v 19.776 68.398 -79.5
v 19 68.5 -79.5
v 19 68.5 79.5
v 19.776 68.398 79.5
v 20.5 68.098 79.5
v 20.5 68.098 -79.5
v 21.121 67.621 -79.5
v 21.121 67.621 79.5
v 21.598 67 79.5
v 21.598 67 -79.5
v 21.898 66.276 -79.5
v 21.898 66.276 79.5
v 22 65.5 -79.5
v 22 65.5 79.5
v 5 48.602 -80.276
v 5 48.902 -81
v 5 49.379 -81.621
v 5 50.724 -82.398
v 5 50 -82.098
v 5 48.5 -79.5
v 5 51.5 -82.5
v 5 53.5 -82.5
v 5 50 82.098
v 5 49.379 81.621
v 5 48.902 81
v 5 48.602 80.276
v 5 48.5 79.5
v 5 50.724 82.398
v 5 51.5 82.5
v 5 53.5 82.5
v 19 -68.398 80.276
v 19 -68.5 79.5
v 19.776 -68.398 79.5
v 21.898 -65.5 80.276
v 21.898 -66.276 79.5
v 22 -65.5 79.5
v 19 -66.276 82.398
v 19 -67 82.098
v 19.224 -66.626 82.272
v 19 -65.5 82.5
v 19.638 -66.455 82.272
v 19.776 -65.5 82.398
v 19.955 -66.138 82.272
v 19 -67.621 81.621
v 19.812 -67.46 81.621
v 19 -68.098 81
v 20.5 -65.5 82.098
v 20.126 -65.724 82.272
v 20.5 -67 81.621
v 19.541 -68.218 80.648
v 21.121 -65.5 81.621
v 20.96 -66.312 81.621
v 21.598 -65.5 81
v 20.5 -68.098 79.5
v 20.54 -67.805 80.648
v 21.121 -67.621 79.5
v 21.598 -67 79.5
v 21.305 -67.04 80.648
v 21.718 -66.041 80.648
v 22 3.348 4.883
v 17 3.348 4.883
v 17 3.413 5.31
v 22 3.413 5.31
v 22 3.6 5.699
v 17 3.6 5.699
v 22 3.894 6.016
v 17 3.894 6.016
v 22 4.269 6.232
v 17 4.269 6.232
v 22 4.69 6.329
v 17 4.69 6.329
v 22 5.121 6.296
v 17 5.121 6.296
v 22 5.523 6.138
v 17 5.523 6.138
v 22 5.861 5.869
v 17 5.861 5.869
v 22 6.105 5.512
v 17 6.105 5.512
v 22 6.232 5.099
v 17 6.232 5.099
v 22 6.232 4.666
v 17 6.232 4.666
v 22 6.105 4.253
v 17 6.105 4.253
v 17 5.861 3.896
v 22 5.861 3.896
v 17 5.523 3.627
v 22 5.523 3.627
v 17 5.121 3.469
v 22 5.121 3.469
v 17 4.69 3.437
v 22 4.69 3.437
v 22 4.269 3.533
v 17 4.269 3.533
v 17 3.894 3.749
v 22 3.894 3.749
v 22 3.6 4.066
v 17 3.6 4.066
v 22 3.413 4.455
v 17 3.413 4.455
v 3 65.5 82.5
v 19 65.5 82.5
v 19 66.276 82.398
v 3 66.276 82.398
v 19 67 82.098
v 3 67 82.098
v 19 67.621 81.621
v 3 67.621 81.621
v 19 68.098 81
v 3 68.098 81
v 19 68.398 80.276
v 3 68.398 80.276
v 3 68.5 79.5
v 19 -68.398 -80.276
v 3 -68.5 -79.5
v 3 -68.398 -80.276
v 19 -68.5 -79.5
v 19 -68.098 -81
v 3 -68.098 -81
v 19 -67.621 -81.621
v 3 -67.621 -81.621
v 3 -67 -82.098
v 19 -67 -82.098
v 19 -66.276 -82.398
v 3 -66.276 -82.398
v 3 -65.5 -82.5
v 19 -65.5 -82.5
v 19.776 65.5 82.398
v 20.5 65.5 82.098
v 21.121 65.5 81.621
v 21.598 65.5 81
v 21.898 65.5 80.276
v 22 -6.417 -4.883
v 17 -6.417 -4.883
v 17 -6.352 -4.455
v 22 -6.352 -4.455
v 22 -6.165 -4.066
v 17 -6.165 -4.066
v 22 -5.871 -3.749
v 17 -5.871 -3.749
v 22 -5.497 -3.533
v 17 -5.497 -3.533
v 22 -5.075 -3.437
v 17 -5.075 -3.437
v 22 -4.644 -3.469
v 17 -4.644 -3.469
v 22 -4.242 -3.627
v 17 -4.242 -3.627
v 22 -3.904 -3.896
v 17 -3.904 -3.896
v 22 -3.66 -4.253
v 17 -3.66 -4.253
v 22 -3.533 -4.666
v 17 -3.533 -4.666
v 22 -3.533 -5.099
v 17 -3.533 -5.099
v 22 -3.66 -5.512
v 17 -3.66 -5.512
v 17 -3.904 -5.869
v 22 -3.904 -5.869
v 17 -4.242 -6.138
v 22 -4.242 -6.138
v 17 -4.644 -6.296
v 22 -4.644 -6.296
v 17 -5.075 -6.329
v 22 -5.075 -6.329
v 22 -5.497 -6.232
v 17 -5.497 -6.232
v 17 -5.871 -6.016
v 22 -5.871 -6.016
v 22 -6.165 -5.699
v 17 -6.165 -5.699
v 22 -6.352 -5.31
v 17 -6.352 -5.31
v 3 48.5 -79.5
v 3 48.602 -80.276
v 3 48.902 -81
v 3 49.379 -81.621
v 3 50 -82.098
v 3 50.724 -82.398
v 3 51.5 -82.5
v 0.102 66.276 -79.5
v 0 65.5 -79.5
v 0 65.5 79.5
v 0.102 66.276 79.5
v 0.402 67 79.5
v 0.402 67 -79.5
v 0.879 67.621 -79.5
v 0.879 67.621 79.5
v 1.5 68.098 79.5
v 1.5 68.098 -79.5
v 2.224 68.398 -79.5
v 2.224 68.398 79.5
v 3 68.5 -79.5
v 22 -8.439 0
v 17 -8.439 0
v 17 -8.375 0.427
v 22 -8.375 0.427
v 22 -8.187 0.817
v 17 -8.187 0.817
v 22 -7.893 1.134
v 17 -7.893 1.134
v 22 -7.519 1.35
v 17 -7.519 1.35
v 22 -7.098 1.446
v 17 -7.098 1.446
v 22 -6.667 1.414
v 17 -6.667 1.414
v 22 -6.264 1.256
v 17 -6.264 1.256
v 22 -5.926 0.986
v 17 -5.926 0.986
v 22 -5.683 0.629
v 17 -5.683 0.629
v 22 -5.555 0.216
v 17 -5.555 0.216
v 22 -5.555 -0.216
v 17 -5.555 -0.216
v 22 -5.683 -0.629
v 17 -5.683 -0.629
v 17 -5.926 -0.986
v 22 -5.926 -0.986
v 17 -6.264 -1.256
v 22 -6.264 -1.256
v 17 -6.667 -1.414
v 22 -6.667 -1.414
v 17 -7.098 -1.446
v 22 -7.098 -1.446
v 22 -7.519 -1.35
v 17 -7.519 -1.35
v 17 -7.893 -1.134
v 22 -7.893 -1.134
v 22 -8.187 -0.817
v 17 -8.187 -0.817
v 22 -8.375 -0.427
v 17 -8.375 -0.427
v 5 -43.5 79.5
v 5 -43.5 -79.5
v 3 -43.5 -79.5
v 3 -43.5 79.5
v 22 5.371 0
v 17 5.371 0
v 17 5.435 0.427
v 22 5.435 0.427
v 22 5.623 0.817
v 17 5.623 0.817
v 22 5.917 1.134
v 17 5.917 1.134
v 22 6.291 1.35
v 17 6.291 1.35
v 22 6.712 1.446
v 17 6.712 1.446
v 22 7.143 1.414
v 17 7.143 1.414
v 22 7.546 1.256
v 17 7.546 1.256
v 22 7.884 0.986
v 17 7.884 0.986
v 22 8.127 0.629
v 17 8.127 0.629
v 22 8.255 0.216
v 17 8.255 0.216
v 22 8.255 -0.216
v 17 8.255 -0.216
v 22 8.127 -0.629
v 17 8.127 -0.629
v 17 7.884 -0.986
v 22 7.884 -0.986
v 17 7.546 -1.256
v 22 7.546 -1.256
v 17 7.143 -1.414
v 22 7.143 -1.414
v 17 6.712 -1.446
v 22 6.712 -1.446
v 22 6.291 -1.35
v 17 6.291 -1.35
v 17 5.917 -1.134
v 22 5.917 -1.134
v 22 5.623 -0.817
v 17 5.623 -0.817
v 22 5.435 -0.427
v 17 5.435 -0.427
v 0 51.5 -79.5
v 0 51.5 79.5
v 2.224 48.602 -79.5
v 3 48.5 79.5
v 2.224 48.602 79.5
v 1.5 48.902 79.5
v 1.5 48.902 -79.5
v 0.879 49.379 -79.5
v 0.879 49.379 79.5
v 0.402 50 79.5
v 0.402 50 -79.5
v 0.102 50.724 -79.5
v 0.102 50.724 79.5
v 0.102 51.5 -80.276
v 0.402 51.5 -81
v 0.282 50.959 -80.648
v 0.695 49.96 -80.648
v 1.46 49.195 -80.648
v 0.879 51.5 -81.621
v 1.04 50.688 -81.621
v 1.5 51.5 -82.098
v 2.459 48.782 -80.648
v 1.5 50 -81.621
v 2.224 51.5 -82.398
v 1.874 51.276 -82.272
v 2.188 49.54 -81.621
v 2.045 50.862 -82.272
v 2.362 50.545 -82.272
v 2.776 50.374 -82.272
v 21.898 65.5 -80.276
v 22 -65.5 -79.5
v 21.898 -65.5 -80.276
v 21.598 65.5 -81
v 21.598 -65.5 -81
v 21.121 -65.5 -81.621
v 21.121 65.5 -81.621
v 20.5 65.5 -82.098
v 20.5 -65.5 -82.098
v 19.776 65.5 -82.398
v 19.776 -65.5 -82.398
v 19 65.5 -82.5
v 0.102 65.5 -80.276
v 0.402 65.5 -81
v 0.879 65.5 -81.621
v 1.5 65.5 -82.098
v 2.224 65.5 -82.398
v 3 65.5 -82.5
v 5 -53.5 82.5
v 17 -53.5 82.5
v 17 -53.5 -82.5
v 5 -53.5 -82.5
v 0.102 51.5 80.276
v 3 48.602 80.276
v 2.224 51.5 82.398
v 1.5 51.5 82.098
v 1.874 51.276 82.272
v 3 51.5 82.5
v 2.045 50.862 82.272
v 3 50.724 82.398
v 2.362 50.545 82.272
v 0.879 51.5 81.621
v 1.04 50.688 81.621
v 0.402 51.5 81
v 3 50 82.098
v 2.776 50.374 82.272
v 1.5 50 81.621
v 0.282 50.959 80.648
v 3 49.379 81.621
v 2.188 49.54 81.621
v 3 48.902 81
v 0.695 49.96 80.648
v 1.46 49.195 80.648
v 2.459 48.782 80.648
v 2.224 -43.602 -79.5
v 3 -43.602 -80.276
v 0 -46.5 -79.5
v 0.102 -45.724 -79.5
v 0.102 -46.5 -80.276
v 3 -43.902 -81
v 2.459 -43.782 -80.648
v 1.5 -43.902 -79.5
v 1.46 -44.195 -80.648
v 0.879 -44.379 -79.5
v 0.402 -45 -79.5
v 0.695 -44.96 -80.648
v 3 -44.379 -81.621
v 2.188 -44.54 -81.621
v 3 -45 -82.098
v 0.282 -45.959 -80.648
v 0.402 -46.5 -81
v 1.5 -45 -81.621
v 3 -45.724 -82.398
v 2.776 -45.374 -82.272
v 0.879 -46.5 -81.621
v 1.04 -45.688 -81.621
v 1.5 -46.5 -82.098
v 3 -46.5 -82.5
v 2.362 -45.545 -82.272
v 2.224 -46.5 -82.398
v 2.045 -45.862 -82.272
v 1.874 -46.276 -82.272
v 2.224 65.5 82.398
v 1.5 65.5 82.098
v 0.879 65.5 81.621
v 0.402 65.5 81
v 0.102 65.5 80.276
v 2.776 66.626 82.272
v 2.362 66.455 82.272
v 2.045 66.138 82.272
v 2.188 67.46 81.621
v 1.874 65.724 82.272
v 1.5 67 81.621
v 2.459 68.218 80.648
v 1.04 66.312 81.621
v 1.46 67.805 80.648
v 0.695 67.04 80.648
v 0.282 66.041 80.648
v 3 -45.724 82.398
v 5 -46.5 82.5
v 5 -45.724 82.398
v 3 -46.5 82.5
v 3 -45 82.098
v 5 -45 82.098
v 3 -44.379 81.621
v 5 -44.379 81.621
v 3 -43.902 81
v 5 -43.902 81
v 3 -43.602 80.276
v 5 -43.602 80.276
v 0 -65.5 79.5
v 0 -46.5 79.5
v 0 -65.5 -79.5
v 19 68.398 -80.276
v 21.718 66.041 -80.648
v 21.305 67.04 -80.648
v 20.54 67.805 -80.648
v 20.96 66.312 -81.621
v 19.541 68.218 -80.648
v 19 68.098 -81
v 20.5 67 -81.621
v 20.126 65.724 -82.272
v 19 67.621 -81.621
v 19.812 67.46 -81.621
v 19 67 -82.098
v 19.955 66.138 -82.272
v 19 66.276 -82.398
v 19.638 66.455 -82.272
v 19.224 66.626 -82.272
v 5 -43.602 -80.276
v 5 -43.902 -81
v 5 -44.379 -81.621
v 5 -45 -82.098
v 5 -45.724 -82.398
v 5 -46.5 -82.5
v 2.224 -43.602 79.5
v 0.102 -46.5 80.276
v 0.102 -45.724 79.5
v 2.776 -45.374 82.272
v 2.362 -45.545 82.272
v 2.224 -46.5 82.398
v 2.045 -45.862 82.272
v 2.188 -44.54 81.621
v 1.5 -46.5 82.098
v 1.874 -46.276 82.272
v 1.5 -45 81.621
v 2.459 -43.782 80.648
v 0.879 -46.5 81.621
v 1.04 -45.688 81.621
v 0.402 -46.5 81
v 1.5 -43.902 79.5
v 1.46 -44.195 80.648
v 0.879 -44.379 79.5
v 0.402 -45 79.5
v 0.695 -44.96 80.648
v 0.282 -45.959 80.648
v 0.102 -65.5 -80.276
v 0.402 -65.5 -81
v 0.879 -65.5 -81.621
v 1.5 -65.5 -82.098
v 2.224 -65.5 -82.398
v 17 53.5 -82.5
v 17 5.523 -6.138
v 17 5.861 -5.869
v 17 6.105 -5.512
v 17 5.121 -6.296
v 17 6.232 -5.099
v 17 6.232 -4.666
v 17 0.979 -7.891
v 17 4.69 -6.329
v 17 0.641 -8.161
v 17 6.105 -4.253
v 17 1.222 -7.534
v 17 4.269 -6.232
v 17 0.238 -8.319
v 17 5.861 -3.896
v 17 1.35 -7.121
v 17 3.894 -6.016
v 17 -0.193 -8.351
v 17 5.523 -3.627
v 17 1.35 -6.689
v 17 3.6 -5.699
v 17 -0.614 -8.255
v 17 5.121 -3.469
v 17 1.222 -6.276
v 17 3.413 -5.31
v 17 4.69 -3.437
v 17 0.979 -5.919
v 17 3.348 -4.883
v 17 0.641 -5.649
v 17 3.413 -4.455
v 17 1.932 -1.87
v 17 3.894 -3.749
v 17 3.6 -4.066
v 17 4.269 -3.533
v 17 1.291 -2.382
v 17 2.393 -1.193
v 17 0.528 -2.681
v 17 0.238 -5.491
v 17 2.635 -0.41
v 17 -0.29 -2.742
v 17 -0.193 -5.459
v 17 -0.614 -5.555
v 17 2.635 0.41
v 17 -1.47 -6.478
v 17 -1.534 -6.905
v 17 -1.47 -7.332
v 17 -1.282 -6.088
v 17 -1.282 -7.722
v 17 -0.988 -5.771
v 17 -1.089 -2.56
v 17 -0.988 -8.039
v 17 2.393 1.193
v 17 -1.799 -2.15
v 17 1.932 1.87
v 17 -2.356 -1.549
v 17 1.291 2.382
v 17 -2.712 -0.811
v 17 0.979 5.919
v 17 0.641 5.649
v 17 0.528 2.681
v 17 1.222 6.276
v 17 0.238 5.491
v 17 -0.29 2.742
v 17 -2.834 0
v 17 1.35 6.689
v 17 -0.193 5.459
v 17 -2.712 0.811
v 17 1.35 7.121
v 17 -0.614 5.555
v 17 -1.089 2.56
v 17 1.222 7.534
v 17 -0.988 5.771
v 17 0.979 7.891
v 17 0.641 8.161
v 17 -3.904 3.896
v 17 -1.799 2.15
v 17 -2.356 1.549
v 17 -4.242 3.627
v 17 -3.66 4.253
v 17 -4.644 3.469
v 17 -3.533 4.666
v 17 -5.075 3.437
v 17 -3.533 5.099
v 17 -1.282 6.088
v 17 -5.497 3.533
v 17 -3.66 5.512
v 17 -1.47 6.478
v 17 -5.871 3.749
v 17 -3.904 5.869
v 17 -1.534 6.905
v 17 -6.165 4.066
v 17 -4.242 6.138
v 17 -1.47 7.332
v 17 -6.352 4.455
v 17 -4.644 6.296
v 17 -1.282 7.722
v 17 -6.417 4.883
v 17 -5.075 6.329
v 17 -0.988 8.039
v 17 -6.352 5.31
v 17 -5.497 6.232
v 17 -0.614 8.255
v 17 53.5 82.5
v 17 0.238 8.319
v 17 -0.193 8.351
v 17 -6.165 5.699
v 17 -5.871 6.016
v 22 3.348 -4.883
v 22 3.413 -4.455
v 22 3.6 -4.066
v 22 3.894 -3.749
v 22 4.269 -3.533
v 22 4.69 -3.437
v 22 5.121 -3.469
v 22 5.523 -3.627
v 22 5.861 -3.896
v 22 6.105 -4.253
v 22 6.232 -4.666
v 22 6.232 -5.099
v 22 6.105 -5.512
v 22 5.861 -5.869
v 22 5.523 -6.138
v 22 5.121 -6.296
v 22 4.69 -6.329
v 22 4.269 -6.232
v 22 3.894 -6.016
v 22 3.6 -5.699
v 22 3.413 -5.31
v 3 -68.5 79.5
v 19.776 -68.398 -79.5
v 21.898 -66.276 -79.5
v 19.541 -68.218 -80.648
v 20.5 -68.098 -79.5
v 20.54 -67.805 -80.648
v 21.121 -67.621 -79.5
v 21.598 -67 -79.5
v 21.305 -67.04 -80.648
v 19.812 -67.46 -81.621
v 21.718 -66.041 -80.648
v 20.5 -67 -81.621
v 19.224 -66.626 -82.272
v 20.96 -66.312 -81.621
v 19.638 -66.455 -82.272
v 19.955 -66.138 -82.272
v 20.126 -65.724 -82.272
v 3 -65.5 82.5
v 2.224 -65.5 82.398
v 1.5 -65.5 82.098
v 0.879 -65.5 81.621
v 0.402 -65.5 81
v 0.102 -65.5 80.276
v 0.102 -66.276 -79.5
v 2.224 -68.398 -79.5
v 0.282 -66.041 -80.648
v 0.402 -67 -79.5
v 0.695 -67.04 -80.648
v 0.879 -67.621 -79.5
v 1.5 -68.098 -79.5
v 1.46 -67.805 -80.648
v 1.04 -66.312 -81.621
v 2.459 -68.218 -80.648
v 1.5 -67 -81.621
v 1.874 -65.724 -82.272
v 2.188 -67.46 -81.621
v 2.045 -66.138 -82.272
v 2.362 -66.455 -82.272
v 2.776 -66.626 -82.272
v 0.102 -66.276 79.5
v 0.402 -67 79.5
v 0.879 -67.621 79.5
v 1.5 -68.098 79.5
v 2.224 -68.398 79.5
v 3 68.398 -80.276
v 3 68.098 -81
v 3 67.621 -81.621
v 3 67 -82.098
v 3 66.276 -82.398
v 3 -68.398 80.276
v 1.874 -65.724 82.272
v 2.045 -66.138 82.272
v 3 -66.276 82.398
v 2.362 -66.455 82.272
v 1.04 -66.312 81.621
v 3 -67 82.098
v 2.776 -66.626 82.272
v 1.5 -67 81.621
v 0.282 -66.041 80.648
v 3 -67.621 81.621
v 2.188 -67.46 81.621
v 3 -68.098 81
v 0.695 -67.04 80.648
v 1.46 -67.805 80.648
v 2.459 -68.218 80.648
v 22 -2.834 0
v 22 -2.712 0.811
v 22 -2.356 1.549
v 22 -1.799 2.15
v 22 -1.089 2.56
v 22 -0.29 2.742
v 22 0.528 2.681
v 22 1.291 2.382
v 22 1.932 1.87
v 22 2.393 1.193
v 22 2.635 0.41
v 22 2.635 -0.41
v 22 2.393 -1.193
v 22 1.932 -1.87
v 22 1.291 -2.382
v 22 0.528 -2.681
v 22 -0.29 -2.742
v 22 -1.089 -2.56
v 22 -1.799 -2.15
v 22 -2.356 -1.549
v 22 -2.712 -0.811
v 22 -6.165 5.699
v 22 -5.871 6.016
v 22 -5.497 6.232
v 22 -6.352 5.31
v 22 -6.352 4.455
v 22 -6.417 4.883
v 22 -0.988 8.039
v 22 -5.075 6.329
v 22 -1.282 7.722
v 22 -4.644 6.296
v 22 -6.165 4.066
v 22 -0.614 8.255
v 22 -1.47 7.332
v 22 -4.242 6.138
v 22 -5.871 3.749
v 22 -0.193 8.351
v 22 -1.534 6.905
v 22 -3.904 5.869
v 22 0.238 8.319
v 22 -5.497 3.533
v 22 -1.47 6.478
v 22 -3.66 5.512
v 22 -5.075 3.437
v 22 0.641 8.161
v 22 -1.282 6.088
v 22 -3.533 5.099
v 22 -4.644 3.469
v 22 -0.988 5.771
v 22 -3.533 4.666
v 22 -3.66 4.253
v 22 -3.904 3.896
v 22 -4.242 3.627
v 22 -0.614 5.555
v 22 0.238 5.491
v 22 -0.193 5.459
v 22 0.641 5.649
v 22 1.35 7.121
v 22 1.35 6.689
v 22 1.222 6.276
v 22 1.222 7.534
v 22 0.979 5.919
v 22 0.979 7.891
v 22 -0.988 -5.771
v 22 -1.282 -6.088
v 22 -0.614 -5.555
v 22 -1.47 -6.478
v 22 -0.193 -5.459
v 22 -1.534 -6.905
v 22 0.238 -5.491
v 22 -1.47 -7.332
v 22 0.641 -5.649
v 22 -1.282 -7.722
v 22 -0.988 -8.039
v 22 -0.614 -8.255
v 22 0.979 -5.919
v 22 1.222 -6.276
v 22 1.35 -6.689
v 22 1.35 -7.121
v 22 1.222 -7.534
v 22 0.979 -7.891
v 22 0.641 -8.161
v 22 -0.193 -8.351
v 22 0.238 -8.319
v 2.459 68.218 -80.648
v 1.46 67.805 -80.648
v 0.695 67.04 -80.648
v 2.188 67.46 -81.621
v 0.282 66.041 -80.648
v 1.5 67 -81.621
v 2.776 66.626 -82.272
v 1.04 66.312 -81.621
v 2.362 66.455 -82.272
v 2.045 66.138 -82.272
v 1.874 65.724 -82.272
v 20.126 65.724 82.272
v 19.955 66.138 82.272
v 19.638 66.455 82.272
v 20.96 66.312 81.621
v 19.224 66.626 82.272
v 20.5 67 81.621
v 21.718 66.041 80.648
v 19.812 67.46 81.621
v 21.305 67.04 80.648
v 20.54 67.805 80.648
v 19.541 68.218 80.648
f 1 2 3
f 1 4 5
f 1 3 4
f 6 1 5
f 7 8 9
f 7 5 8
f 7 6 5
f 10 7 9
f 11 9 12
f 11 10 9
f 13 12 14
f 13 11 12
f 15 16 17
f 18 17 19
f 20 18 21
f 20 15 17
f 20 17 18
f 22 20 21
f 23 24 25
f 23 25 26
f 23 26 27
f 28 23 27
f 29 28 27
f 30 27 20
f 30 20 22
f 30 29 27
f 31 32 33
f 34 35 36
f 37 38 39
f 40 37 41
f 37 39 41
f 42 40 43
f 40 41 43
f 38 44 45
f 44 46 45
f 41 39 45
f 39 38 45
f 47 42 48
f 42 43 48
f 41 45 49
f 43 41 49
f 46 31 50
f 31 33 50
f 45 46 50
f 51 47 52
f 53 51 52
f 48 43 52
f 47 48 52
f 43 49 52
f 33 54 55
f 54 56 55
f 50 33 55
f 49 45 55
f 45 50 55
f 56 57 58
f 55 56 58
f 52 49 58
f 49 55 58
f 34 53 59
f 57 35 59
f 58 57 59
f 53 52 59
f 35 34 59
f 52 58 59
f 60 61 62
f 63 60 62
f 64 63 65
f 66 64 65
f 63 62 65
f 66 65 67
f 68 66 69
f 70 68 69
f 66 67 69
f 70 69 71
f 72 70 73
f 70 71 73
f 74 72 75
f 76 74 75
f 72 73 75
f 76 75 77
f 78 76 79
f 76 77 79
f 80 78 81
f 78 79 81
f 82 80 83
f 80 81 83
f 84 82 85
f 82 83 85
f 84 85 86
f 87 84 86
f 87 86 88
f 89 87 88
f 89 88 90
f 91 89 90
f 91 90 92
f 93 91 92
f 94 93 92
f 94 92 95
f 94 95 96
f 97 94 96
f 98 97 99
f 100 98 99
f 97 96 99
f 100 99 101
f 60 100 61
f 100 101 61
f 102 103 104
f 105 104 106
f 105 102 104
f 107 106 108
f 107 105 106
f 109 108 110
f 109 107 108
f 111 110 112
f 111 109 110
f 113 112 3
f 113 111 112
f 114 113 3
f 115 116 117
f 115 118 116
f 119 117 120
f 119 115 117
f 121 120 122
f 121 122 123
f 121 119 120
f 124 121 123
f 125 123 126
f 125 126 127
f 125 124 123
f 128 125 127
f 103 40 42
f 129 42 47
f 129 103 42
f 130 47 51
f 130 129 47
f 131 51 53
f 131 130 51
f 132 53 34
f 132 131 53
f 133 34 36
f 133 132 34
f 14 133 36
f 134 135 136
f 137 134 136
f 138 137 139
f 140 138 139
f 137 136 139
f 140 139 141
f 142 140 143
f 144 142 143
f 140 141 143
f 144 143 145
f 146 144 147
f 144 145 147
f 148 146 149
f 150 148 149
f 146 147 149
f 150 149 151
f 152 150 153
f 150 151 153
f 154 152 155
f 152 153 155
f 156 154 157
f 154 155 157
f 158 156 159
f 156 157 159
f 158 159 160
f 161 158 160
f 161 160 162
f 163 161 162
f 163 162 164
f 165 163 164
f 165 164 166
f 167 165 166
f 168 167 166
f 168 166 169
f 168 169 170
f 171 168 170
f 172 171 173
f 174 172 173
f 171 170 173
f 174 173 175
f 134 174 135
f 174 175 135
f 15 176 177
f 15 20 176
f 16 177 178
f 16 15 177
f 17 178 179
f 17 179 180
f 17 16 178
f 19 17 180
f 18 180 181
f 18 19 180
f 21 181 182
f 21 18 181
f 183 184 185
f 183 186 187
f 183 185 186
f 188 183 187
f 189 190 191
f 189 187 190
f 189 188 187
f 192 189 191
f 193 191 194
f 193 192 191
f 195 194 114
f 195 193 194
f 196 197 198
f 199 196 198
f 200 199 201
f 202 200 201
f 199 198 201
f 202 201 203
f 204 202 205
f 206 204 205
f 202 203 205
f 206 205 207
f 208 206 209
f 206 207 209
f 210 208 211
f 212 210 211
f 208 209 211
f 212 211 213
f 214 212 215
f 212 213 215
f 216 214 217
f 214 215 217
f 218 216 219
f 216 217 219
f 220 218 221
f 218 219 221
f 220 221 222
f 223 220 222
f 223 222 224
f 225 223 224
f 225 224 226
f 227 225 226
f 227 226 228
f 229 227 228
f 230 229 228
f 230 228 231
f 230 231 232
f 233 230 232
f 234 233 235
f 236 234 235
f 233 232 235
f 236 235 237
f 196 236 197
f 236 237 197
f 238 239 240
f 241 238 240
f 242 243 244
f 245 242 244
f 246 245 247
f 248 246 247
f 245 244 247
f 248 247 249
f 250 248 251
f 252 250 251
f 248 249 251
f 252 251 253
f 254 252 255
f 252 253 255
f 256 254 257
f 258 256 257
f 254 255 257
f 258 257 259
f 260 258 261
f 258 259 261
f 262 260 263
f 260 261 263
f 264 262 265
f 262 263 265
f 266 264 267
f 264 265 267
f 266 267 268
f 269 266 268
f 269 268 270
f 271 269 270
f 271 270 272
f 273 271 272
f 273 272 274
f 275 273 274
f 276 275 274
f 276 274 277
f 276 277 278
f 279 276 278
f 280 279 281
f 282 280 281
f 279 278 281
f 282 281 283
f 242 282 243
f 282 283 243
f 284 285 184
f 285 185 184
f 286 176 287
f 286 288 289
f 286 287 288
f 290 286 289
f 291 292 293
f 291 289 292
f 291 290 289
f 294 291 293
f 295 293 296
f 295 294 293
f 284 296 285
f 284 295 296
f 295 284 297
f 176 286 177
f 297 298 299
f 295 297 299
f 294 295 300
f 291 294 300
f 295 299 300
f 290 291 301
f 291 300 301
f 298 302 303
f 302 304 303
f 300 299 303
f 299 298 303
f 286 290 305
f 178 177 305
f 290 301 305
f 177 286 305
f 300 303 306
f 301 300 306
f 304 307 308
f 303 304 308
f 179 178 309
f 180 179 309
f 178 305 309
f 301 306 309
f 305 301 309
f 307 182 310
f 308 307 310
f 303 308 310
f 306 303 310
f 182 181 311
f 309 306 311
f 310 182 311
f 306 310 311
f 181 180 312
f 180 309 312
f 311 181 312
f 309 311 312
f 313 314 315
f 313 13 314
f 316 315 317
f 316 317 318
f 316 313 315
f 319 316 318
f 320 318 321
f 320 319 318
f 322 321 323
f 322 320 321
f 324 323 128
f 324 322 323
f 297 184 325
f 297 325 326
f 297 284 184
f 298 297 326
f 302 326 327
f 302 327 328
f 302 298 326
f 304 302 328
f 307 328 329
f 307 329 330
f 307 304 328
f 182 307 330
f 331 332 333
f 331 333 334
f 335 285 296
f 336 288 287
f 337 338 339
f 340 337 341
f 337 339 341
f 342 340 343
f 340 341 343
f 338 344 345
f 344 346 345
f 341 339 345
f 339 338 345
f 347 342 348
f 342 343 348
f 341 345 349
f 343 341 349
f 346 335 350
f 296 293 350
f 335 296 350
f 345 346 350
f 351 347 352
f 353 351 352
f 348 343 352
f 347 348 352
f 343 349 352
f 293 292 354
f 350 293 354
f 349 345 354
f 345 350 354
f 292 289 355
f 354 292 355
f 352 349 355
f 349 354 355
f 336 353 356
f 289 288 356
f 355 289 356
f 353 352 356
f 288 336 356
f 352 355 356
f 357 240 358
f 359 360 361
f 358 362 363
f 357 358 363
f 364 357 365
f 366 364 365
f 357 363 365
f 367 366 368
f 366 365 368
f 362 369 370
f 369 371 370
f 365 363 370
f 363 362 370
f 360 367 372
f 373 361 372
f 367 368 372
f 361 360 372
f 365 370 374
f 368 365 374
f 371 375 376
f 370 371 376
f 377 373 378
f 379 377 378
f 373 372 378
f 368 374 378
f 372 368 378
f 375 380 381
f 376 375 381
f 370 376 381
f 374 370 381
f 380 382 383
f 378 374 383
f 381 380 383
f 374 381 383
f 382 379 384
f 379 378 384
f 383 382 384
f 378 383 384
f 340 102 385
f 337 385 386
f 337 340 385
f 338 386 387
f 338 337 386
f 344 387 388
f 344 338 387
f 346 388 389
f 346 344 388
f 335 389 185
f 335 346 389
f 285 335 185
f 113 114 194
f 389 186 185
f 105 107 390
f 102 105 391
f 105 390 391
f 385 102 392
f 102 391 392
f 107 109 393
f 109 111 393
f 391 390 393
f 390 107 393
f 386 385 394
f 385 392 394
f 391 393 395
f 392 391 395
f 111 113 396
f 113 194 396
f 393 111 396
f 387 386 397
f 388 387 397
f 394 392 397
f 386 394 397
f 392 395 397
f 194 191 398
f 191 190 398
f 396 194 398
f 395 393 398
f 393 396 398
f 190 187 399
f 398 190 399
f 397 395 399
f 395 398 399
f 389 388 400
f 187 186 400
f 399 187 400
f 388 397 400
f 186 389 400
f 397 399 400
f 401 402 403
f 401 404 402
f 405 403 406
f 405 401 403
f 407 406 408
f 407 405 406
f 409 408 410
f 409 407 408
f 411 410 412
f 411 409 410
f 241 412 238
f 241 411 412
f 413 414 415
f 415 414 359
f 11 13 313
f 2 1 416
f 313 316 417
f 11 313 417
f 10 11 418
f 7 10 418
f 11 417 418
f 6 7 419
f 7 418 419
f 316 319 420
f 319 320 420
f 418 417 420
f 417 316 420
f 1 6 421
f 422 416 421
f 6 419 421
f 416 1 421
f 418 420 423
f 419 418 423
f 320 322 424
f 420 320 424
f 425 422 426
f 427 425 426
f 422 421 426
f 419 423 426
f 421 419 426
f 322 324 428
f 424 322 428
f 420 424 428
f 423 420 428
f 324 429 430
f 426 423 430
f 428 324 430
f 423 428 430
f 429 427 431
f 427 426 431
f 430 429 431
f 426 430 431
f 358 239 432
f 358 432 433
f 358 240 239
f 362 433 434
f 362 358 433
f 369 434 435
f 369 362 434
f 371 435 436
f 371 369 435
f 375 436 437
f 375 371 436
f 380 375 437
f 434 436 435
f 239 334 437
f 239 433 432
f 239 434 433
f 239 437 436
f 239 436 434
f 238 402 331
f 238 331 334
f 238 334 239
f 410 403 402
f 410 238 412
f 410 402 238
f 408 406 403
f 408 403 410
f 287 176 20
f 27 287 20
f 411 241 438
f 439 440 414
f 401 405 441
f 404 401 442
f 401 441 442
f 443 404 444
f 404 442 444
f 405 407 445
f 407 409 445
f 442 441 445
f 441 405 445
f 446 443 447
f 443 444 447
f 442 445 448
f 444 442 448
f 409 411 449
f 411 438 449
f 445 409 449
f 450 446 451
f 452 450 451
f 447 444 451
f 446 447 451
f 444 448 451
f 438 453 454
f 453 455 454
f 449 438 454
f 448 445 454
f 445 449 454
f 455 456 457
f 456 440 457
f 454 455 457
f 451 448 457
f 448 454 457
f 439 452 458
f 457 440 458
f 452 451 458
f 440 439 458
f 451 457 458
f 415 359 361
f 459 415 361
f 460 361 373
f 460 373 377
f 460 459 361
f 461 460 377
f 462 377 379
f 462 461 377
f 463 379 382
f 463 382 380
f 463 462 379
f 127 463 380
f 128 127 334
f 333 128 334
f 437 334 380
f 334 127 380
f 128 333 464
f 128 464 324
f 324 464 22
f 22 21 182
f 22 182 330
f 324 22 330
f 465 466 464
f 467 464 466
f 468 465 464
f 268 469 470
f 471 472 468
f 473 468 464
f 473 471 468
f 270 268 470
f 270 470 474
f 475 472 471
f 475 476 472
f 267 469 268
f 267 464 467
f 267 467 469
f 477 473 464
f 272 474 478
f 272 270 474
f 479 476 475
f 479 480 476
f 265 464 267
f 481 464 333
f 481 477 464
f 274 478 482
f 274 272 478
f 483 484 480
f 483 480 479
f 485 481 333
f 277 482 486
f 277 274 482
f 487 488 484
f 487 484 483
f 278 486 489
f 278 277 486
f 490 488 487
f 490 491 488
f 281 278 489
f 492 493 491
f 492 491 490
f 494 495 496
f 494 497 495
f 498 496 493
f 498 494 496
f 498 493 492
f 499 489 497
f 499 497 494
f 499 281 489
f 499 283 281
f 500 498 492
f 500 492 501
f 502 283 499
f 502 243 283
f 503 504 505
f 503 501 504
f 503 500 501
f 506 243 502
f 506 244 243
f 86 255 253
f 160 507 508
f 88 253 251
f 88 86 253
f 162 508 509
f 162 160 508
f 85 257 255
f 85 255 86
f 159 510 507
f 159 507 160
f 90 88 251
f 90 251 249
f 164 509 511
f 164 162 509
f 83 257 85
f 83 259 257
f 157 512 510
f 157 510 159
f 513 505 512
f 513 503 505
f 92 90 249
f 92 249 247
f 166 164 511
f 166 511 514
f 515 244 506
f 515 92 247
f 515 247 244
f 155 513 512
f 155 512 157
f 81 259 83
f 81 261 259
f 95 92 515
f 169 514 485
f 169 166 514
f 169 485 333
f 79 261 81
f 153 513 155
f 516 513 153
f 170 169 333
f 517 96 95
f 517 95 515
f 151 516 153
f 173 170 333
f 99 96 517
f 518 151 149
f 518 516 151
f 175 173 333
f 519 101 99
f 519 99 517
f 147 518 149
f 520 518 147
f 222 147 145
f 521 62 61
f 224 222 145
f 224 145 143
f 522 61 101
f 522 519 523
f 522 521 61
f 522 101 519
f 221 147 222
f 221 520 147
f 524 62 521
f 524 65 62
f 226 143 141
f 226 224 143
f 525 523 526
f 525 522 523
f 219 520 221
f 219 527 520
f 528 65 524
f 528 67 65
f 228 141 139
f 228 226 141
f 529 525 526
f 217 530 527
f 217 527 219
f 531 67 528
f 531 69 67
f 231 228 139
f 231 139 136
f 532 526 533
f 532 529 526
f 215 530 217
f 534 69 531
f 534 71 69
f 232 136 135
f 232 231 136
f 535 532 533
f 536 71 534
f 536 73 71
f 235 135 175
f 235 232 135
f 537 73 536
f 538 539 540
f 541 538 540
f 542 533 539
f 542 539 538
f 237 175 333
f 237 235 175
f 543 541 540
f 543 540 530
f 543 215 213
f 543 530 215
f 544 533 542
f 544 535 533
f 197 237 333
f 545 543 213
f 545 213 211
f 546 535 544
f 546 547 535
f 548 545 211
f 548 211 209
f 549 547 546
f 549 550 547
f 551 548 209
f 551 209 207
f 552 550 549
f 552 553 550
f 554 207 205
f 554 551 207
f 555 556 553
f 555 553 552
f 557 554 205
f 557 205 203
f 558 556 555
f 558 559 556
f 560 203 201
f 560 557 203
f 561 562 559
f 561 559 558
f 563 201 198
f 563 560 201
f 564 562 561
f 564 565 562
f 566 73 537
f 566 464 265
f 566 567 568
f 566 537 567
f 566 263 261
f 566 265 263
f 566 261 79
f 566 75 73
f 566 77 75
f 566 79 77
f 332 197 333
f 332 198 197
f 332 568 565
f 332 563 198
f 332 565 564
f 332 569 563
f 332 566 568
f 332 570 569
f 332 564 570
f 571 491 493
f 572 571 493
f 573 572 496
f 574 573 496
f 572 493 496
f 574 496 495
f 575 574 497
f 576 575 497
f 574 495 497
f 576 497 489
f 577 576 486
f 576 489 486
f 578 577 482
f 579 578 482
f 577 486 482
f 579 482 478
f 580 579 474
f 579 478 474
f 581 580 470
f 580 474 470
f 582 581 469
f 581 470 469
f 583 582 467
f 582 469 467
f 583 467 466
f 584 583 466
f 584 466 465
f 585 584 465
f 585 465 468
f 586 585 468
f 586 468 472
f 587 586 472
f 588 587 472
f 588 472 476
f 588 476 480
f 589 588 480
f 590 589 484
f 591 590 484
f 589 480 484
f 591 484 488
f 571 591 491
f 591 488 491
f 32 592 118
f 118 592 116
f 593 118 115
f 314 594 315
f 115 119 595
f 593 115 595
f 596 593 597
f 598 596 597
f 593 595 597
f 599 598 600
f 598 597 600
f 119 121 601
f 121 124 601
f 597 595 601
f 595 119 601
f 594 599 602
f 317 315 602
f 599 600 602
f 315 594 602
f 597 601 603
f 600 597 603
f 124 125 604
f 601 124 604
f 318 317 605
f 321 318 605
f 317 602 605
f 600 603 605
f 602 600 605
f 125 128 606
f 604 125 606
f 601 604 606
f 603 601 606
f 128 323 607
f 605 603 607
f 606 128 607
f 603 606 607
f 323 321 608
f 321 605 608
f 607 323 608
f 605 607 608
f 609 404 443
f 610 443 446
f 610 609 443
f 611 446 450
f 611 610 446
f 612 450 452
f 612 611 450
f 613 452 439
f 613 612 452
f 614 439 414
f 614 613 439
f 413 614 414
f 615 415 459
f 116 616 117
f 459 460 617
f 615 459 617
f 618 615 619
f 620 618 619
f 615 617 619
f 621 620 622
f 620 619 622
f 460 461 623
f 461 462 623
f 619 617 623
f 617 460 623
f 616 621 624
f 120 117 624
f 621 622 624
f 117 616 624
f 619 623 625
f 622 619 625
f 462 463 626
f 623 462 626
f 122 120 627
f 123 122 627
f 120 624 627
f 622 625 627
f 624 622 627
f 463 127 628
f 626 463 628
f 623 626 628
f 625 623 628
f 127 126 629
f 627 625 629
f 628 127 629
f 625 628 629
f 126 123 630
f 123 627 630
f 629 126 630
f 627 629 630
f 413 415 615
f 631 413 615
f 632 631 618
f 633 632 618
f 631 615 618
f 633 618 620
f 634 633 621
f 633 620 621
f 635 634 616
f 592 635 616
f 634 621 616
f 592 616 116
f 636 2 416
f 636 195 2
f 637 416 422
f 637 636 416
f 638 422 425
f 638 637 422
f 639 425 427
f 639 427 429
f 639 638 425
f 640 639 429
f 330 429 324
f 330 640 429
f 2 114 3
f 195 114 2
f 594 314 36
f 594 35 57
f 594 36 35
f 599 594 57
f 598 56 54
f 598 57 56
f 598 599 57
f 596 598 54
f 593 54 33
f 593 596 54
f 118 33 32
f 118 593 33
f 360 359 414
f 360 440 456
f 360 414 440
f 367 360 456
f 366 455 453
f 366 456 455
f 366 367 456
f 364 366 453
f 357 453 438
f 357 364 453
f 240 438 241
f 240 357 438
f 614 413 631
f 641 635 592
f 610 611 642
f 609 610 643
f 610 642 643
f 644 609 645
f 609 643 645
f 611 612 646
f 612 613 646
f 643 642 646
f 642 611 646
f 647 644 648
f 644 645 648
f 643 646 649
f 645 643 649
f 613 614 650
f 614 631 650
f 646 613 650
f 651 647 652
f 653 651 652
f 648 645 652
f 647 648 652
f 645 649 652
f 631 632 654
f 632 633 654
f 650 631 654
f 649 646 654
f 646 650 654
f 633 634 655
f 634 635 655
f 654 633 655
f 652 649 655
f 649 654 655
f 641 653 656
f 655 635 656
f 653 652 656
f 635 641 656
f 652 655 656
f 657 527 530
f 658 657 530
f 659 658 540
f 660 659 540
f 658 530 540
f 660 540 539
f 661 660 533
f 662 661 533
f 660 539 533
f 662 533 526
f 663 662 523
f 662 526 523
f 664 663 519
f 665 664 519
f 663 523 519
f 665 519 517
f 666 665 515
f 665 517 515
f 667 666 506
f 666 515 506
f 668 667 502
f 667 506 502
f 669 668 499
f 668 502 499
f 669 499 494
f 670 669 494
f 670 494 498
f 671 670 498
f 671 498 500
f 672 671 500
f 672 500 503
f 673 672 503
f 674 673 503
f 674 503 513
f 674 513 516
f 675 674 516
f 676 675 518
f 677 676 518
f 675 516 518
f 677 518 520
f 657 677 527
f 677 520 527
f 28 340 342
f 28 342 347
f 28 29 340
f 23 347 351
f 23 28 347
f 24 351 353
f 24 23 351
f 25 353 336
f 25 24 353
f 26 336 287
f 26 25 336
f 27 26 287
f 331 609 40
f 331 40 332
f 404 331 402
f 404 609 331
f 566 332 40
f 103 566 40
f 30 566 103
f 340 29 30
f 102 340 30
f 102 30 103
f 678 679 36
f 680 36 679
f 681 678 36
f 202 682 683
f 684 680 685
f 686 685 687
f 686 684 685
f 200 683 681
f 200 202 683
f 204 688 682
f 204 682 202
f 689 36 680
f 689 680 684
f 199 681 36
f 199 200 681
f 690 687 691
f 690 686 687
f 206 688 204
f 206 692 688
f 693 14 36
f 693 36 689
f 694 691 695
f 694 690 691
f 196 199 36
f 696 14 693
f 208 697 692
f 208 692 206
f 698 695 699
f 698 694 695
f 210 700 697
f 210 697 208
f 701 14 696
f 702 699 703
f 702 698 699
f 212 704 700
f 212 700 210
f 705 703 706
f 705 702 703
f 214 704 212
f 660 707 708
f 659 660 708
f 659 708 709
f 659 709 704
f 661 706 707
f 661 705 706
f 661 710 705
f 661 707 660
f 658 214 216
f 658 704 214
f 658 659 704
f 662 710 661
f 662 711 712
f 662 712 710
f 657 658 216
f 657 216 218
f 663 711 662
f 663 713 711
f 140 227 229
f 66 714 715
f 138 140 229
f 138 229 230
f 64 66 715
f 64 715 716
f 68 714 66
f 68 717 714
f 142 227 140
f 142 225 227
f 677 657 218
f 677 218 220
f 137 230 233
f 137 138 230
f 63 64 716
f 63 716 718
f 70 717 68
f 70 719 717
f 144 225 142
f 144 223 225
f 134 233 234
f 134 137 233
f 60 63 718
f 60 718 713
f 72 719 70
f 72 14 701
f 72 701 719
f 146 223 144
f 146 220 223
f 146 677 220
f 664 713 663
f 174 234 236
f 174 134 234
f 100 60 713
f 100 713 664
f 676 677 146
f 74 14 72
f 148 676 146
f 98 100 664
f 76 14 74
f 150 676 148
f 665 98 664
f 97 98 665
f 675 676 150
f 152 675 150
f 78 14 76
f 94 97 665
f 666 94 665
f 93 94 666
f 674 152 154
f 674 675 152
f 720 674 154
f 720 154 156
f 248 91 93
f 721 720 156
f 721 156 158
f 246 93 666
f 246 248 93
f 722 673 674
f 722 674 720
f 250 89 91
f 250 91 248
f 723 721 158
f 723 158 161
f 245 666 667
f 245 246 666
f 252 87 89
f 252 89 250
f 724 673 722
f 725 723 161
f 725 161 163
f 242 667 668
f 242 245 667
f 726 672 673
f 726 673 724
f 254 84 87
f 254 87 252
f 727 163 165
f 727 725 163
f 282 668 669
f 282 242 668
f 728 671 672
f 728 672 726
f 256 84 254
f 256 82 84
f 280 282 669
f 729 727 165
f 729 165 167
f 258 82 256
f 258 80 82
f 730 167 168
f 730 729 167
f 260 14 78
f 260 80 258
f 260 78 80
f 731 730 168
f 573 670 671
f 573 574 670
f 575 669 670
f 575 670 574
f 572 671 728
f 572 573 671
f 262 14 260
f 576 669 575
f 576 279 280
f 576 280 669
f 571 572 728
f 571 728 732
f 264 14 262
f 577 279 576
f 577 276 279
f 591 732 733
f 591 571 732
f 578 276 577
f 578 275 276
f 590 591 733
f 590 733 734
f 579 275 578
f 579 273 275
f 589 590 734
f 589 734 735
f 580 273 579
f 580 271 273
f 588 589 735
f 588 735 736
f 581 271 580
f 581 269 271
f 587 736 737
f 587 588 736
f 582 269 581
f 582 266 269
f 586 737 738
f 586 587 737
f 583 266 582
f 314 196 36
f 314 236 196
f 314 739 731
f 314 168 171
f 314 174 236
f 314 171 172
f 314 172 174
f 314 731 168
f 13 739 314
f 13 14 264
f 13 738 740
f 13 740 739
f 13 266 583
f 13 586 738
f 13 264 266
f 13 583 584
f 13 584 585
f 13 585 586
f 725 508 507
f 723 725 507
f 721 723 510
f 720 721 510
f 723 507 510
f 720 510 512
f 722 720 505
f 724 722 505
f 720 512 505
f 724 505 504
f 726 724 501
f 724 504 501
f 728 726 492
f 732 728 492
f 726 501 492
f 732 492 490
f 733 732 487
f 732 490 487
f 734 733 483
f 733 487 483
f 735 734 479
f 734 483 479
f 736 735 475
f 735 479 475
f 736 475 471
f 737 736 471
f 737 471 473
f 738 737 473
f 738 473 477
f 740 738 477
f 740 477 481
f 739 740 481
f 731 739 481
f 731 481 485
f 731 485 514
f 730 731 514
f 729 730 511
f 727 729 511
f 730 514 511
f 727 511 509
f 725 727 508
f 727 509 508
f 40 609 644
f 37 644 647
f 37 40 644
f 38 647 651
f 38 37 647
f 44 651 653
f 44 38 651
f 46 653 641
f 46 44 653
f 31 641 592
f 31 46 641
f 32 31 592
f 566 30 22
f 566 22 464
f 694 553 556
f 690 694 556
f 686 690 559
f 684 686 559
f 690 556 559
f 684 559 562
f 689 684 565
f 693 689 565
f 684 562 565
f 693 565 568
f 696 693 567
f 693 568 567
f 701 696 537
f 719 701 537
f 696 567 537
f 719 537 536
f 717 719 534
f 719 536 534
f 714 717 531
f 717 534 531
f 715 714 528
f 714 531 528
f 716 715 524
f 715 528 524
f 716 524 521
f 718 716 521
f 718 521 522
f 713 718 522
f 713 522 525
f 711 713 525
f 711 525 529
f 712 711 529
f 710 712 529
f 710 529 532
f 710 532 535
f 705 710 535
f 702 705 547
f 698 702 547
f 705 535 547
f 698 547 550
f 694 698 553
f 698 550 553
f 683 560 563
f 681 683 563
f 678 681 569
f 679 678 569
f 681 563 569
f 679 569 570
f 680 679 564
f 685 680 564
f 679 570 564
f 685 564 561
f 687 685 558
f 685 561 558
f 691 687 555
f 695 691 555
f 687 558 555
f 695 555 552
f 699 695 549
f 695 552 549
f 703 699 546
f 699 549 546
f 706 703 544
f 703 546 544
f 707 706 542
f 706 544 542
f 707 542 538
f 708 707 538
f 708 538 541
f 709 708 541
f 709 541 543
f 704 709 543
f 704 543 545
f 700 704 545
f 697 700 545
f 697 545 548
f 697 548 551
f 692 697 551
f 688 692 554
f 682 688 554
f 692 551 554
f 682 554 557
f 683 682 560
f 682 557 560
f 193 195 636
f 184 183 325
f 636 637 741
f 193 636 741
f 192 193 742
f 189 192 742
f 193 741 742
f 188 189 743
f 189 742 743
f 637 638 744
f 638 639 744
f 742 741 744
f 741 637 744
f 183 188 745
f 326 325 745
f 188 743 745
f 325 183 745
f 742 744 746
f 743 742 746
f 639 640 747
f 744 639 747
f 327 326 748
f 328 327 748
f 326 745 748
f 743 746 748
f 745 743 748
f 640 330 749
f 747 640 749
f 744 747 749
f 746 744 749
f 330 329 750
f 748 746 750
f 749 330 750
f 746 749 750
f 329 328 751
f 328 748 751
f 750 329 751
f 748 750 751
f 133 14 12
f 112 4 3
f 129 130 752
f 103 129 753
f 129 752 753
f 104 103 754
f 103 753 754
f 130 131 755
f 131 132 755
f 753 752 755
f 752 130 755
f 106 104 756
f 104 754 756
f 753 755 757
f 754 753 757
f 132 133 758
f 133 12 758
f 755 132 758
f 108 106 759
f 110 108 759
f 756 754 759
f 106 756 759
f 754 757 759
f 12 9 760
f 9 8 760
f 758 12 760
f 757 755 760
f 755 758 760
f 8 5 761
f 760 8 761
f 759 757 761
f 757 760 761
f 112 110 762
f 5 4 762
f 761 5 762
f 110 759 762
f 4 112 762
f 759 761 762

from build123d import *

# Parameters (mm, degrees)
SKETCH1_W           = 165
SKETCH1_H           = 137
BOSS_EXTRUDE1_DEPTH = 22
CUT_EXTRUDE1_DEPTH  = 165
FILLET1_R           = 3
SKETCH3_R           = 2.75
SKETCH3_R_2         = 1.45
CUT_EXTRUDE2_DEPTH  = 5
FILLET2_R           = 3
FILLET3_R           = 3


with BuildPart() as part:
    # Sketch1 → Boss-Extrude1 (new body)
    with BuildSketch(Plane(origin=(0, 0, 0), x_dir=(0, 0, -1), z_dir=(1, 0, 0))):
        Rectangle(SKETCH1_W, SKETCH1_H)
    extrude(amount=BOSS_EXTRUDE1_DEPTH)

    # Sketch2 → Cut-Extrude1 (cut)
    with BuildSketch(Plane.XY.offset(82.5)):
        Polygon((0, 48.5), (5, 48.5), (5, 53.5), (17, 53.5), (17, -53.5), (5, -53.5), (5, -43.5), (0, -43.5), align=None)
    extrude(amount=-CUT_EXTRUDE1_DEPTH, mode=Mode.SUBTRACT)

    # Fillet1
    fillet1_edges = [part.edges().sort_by_distance(p)[0] for p in [
        (22, -68.5, 0),
        (0, -43.5, 0),
        (0, 48.5, 0),
        (0, -68.5, 0),
        (0, 68.5, 0),
        (22, 68.5, 0),
    ]]
    fillet(fillet1_edges, radius=FILLET1_R)

    # Sketch3 → Cut-Extrude2 (cut)
    with BuildSketch(Plane.ZY.offset(-17)):
        with Locations(Location((0, -0.084265268, 0), (0, 0, 270))):
            Circle(SKETCH3_R)
        with Locations(Location((6.905, -0.084265268, 0), (0, 0, 270))):
            Circle(SKETCH3_R_2)
        with Locations(Location((4.882572324, -4.966837592, 0), (0, 0, 270))):
            Circle(SKETCH3_R_2)
        with Locations(Location((0, -6.989265268, 0), (0, 0, 270))):
            Circle(SKETCH3_R_2)
        with Locations(Location((-4.882572324, -4.966837592, 0), (0, 0, 270))):
            Circle(SKETCH3_R_2)
        with Locations(Location((-6.905, -0.084265268, 0), (0, 0, 270))):
            Circle(SKETCH3_R_2)
        with Locations(Location((-4.882572324, 4.798307056, 0), (0, 0, 270))):
            Circle(SKETCH3_R_2)
        with Locations(Location((0, 6.820734732, 0), (0, 0, 270))):
            Circle(SKETCH3_R_2)
        with Locations(Location((4.882572324, 4.798307056, 0), (0, 0, 270))):
            Circle(SKETCH3_R_2)
    extrude(amount=-CUT_EXTRUDE2_DEPTH, mode=Mode.SUBTRACT)

    # Fillet2
    fillet2_edges = [part.edges().sort_by_distance(p)[0] for p in [
        (4, 48.5, -82.5),
        (22, 0, -82.5),
        (0, 58.5, -82.5),
        (11, 68.5, -82.5),
        (11, -68.5, -82.5),
        (0, -56, -82.5),
        (4, -43.5, -82.5),
        (0.878679656, -44.378679656, -82.5),
        (0.878679656, 49.378679656, -82.5),
        (0.878679656, 67.621320344, -82.5),
        (21.121320344, 67.621320344, -82.5),
        (0.878679656, -67.621320344, -82.5),
        (21.121320344, -67.621320344, -82.5),
    ]]
    fillet(fillet2_edges, radius=FILLET2_R)

    # Fillet3
    fillet3_edges = [part.edges().sort_by_distance(p)[0] for p in [
        (4, 48.5, 82.5),
        (22, 0, 82.5),
        (11, -68.5, 82.5),
        (0, 58.5, 82.5),
        (4, -43.5, 82.5),
        (0, -56, 82.5),
        (11, 68.5, 82.5),
        (0.878679656, -44.378679656, 82.5),
        (0.878679656, 49.378679656, 82.5),
        (0.878679656, 67.621320344, 82.5),
        (21.121320344, 67.621320344, 82.5),
        (0.878679656, -67.621320344, 82.5),
        (21.121320344, -67.621320344, 82.5),
    ]]
    fillet(fillet3_edges, radius=FILLET3_R)


solid = part.part
